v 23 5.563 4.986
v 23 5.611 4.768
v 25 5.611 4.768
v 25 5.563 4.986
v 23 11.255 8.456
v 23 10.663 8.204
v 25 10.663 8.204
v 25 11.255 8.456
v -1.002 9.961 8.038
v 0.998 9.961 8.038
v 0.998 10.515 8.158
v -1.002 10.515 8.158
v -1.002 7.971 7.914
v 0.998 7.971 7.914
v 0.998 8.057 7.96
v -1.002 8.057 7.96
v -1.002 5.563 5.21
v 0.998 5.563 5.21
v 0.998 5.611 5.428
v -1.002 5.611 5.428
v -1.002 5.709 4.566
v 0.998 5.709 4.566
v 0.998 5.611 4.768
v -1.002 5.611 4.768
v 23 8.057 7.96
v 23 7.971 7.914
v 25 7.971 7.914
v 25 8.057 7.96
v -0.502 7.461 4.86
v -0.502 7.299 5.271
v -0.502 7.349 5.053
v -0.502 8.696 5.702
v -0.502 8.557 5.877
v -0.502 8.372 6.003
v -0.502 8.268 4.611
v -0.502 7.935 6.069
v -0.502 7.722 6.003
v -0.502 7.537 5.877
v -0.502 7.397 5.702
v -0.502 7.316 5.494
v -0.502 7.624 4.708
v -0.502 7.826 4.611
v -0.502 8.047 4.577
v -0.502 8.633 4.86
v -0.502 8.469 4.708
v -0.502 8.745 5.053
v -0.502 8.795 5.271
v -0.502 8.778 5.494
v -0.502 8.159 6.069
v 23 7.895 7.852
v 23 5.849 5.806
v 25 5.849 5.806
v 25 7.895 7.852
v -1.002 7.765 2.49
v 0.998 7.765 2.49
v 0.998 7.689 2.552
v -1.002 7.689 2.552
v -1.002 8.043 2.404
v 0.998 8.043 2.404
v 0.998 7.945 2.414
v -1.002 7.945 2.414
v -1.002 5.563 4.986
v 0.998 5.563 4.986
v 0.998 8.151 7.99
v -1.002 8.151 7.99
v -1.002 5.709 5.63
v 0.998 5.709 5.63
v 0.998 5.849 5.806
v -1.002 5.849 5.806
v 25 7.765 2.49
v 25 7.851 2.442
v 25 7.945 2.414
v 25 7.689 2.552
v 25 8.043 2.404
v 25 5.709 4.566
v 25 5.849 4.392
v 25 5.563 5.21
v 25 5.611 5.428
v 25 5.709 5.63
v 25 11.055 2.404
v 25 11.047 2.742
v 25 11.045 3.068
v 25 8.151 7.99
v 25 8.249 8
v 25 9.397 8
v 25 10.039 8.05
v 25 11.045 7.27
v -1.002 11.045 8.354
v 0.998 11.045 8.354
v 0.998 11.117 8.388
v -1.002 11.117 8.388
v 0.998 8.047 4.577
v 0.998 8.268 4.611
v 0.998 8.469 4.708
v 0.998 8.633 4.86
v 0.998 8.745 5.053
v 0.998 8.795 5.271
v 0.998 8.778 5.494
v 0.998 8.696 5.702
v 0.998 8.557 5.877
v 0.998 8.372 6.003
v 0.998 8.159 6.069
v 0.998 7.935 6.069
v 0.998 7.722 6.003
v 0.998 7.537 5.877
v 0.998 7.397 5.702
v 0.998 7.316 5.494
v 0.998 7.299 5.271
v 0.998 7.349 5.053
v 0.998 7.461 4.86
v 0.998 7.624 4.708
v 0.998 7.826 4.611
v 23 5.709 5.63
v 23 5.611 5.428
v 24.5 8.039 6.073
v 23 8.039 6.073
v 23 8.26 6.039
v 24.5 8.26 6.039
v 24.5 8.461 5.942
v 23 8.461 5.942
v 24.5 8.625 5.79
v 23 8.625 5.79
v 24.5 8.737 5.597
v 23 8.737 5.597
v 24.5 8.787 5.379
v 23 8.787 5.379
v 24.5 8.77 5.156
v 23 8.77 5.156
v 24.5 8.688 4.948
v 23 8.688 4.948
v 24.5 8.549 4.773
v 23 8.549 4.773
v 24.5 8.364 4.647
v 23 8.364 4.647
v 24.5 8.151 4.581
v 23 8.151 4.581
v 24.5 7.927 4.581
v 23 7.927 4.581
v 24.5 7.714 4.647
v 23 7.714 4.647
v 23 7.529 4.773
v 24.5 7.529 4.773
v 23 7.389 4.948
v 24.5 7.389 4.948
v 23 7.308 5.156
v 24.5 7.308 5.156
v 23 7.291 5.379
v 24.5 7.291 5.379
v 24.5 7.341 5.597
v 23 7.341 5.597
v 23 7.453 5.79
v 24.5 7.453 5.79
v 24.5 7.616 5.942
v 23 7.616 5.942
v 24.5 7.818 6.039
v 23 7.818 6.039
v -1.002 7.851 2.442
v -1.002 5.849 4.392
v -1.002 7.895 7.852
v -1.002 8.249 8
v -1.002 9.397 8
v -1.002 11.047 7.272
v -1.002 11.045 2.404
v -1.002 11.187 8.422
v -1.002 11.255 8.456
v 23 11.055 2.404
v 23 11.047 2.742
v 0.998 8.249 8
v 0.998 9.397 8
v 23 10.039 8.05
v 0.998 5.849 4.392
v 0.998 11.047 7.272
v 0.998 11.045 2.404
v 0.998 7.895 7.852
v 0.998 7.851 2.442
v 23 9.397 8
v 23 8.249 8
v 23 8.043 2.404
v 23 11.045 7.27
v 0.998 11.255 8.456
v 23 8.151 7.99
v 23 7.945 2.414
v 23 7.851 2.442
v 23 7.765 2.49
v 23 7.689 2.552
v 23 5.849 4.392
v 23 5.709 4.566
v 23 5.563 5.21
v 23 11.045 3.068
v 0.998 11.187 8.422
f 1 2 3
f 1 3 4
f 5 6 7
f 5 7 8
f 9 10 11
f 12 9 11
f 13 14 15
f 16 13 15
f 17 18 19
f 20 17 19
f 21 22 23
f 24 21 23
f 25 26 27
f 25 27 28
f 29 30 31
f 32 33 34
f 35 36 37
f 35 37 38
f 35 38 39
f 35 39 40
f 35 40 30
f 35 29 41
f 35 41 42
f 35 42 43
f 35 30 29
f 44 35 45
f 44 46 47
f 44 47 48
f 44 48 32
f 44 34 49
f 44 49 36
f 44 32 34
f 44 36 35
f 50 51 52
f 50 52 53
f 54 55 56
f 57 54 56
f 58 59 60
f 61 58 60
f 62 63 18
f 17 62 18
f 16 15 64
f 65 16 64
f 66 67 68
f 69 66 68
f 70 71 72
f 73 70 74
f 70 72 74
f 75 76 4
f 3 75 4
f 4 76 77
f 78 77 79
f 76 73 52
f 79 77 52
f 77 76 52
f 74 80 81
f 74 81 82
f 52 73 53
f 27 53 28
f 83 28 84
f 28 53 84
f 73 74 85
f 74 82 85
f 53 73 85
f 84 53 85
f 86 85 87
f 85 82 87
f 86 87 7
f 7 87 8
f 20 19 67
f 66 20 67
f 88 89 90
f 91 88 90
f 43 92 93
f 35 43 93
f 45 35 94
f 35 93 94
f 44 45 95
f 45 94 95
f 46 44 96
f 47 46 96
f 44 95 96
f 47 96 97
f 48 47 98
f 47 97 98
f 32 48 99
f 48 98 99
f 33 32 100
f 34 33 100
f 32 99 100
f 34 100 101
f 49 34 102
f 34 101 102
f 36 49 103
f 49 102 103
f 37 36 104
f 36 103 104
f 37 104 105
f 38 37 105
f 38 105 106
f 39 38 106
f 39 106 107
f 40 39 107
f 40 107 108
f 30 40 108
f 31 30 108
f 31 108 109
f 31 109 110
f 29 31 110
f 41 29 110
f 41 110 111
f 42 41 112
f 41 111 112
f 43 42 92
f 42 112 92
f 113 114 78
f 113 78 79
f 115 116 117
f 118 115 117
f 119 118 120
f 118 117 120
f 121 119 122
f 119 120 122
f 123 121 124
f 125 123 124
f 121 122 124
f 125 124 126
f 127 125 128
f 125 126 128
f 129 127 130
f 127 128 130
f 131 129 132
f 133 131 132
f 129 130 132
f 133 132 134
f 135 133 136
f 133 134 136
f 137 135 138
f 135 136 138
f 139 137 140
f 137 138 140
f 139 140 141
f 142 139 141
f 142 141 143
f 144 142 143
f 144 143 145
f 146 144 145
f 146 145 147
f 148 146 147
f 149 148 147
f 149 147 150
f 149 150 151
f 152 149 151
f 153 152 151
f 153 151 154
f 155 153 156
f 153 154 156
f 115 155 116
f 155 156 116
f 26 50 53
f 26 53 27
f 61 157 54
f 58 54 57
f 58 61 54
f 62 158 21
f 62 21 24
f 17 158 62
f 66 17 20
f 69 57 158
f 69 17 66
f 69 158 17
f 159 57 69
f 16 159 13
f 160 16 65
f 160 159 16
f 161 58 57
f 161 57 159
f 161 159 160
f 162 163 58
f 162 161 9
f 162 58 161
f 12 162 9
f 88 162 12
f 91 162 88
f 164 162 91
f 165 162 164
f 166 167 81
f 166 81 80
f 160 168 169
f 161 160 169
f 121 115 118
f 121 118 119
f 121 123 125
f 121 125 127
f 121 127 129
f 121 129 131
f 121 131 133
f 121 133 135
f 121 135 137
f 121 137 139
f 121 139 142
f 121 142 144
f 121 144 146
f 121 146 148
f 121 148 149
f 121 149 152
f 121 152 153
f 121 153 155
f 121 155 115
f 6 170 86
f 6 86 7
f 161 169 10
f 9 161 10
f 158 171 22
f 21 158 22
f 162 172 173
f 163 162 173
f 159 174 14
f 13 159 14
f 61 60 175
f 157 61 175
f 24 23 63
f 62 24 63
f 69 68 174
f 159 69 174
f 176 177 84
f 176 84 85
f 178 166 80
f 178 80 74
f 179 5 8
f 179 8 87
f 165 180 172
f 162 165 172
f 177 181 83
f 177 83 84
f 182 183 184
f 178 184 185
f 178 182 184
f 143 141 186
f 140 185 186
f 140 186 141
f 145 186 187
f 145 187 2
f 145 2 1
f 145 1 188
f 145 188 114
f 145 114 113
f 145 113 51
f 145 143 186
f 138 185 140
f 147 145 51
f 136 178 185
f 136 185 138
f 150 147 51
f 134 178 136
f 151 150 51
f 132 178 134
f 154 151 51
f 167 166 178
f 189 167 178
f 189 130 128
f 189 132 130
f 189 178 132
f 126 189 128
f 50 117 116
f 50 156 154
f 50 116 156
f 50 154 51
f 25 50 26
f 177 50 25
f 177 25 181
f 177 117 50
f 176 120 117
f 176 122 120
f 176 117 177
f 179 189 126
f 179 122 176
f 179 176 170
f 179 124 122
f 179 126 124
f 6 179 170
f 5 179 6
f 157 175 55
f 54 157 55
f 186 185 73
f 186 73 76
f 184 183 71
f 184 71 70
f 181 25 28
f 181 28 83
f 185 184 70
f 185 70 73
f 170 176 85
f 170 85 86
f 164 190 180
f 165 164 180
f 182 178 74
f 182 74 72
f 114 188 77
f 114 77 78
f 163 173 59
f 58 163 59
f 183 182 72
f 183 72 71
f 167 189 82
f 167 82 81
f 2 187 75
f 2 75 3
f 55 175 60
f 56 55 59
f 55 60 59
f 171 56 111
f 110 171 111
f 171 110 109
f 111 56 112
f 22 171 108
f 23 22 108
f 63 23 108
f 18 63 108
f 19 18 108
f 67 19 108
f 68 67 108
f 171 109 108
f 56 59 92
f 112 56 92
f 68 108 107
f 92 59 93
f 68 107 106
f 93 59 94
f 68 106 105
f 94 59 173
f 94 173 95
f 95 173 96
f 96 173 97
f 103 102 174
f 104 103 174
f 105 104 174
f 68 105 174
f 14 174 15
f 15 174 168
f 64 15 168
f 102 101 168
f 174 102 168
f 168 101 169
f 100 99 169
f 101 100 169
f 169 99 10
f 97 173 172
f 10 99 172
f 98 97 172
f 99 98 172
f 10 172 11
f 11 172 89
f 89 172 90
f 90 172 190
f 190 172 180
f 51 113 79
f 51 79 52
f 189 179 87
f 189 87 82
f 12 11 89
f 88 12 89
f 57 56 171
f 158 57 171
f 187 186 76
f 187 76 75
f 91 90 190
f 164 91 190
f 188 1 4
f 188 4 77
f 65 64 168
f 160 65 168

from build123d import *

# Parameters (mm, degrees)
EXTRUDE_1_DEPTH     = 2
SKETCH_7_R          = 0.750002586
CUT_EXTRUDE_1_DEPTH = 1.5
EXTRUDE_2_DEPTH     = 2
SKETCH_10_R         = 0.750007818
CUT_EXTRUDE_6_DEPTH = 1.5


# Read off the part's stored shape, not the designer's step: Поверхность-Импортированный1
with BuildPart() as part:
    # Эскиз1 → Бобышка-Вытянуть1 (new body)
    with BuildSketch(Plane.ZY.offset(-23.000001907)):
        Polygon((2.404000144, 8.042947389), (2.413999988, 7.94494804), (2.441999968, 7.85094779), (2.490000101, 7.764948066), (2.552000107, 7.688947488), (4.392000381, 5.848947447), (4.566000309, 5.708947778), (4.767999984, 5.610947497), (4.986000713, 5.562947597), (5.210000556, 5.562947597), (5.428000353, 5.610947497), (5.630000494, 5.708947778), (5.806000438, 5.848947447), (7.852001116, 7.894948125), (7.914000191, 7.970947772), (7.960000075, 8.056947961), (7.990000769, 8.15094728), (8.00000038, 8.248948492), (8.00000038, 9.39694792), (8.050000295, 10.038947687), (8.204000071, 10.662948713), (8.456000127, 11.254947633), (7.270000409, 11.044948362), (3.068000078, 11.044948362), (2.742000157, 11.046947911), (2.404000144, 11.054947972), align=None)
    extrude(amount=-EXTRUDE_1_DEPTH)

    # Эскиз7 → Вырез-Вытянуть1 (cut)
    with BuildSketch(Plane.ZY.offset(-23.000001907)):
        with Locations((5.322727094, 8.038945713)):
            Circle(SKETCH_7_R)
    extrude(amount=-CUT_EXTRUDE_1_DEPTH, mode=Mode.SUBTRACT)


with BuildPart() as body_2:
    # Эскиз8 → Бобышка-Вытянуть2 (new body)
    with BuildSketch(Plane(origin=(0.998000149, 0, 0), x_dir=(0, 0, -1), z_dir=(1, 0, 0))):
        Polygon((-2.404000144, 11.044948362), (-2.404000144, 8.042947389), (-2.413999988, 7.94494804), (-2.441999968, 7.85094779), (-2.490000101, 7.764948066), (-2.552000107, 7.688947488), (-4.392000381, 5.848947447), (-4.566000309, 5.708947778), (-4.767999984, 5.610947497), (-4.986000713, 5.562947597), (-5.210000556, 5.562947597), (-5.428000353, 5.610947497), (-5.630000494, 5.708947778), (-5.806000438, 5.848947447), (-7.852001116, 7.894948125), (-7.914000191, 7.970947772), (-7.960000075, 8.056947961), (-7.990000769, 8.15094728), (-8.00000038, 8.248948492), (-8.00000038, 9.39694792), (-8.038000204, 9.960947558), (-8.158001117, 10.514947586), (-8.353999816, 11.044948362), (-8.38800054, 11.116947979), (-8.422001265, 11.186948046), (-8.456000127, 11.254947633), (-7.272000425, 11.046947911), align=None)
    extrude(amount=-EXTRUDE_2_DEPTH)

    # Эскиз10 → Вырез-Вытянуть6 (cut)
    with BuildSketch(Plane(origin=(0.998000149, 0, 0), x_dir=(0, 0, -1), z_dir=(1, 0, 0))):
        with Locations((-5.327250078, 8.046939634)):
            Circle(SKETCH_10_R)
    extrude(amount=-CUT_EXTRUDE_6_DEPTH, mode=Mode.SUBTRACT)


solid = Compound([part.part, body_2.part])
